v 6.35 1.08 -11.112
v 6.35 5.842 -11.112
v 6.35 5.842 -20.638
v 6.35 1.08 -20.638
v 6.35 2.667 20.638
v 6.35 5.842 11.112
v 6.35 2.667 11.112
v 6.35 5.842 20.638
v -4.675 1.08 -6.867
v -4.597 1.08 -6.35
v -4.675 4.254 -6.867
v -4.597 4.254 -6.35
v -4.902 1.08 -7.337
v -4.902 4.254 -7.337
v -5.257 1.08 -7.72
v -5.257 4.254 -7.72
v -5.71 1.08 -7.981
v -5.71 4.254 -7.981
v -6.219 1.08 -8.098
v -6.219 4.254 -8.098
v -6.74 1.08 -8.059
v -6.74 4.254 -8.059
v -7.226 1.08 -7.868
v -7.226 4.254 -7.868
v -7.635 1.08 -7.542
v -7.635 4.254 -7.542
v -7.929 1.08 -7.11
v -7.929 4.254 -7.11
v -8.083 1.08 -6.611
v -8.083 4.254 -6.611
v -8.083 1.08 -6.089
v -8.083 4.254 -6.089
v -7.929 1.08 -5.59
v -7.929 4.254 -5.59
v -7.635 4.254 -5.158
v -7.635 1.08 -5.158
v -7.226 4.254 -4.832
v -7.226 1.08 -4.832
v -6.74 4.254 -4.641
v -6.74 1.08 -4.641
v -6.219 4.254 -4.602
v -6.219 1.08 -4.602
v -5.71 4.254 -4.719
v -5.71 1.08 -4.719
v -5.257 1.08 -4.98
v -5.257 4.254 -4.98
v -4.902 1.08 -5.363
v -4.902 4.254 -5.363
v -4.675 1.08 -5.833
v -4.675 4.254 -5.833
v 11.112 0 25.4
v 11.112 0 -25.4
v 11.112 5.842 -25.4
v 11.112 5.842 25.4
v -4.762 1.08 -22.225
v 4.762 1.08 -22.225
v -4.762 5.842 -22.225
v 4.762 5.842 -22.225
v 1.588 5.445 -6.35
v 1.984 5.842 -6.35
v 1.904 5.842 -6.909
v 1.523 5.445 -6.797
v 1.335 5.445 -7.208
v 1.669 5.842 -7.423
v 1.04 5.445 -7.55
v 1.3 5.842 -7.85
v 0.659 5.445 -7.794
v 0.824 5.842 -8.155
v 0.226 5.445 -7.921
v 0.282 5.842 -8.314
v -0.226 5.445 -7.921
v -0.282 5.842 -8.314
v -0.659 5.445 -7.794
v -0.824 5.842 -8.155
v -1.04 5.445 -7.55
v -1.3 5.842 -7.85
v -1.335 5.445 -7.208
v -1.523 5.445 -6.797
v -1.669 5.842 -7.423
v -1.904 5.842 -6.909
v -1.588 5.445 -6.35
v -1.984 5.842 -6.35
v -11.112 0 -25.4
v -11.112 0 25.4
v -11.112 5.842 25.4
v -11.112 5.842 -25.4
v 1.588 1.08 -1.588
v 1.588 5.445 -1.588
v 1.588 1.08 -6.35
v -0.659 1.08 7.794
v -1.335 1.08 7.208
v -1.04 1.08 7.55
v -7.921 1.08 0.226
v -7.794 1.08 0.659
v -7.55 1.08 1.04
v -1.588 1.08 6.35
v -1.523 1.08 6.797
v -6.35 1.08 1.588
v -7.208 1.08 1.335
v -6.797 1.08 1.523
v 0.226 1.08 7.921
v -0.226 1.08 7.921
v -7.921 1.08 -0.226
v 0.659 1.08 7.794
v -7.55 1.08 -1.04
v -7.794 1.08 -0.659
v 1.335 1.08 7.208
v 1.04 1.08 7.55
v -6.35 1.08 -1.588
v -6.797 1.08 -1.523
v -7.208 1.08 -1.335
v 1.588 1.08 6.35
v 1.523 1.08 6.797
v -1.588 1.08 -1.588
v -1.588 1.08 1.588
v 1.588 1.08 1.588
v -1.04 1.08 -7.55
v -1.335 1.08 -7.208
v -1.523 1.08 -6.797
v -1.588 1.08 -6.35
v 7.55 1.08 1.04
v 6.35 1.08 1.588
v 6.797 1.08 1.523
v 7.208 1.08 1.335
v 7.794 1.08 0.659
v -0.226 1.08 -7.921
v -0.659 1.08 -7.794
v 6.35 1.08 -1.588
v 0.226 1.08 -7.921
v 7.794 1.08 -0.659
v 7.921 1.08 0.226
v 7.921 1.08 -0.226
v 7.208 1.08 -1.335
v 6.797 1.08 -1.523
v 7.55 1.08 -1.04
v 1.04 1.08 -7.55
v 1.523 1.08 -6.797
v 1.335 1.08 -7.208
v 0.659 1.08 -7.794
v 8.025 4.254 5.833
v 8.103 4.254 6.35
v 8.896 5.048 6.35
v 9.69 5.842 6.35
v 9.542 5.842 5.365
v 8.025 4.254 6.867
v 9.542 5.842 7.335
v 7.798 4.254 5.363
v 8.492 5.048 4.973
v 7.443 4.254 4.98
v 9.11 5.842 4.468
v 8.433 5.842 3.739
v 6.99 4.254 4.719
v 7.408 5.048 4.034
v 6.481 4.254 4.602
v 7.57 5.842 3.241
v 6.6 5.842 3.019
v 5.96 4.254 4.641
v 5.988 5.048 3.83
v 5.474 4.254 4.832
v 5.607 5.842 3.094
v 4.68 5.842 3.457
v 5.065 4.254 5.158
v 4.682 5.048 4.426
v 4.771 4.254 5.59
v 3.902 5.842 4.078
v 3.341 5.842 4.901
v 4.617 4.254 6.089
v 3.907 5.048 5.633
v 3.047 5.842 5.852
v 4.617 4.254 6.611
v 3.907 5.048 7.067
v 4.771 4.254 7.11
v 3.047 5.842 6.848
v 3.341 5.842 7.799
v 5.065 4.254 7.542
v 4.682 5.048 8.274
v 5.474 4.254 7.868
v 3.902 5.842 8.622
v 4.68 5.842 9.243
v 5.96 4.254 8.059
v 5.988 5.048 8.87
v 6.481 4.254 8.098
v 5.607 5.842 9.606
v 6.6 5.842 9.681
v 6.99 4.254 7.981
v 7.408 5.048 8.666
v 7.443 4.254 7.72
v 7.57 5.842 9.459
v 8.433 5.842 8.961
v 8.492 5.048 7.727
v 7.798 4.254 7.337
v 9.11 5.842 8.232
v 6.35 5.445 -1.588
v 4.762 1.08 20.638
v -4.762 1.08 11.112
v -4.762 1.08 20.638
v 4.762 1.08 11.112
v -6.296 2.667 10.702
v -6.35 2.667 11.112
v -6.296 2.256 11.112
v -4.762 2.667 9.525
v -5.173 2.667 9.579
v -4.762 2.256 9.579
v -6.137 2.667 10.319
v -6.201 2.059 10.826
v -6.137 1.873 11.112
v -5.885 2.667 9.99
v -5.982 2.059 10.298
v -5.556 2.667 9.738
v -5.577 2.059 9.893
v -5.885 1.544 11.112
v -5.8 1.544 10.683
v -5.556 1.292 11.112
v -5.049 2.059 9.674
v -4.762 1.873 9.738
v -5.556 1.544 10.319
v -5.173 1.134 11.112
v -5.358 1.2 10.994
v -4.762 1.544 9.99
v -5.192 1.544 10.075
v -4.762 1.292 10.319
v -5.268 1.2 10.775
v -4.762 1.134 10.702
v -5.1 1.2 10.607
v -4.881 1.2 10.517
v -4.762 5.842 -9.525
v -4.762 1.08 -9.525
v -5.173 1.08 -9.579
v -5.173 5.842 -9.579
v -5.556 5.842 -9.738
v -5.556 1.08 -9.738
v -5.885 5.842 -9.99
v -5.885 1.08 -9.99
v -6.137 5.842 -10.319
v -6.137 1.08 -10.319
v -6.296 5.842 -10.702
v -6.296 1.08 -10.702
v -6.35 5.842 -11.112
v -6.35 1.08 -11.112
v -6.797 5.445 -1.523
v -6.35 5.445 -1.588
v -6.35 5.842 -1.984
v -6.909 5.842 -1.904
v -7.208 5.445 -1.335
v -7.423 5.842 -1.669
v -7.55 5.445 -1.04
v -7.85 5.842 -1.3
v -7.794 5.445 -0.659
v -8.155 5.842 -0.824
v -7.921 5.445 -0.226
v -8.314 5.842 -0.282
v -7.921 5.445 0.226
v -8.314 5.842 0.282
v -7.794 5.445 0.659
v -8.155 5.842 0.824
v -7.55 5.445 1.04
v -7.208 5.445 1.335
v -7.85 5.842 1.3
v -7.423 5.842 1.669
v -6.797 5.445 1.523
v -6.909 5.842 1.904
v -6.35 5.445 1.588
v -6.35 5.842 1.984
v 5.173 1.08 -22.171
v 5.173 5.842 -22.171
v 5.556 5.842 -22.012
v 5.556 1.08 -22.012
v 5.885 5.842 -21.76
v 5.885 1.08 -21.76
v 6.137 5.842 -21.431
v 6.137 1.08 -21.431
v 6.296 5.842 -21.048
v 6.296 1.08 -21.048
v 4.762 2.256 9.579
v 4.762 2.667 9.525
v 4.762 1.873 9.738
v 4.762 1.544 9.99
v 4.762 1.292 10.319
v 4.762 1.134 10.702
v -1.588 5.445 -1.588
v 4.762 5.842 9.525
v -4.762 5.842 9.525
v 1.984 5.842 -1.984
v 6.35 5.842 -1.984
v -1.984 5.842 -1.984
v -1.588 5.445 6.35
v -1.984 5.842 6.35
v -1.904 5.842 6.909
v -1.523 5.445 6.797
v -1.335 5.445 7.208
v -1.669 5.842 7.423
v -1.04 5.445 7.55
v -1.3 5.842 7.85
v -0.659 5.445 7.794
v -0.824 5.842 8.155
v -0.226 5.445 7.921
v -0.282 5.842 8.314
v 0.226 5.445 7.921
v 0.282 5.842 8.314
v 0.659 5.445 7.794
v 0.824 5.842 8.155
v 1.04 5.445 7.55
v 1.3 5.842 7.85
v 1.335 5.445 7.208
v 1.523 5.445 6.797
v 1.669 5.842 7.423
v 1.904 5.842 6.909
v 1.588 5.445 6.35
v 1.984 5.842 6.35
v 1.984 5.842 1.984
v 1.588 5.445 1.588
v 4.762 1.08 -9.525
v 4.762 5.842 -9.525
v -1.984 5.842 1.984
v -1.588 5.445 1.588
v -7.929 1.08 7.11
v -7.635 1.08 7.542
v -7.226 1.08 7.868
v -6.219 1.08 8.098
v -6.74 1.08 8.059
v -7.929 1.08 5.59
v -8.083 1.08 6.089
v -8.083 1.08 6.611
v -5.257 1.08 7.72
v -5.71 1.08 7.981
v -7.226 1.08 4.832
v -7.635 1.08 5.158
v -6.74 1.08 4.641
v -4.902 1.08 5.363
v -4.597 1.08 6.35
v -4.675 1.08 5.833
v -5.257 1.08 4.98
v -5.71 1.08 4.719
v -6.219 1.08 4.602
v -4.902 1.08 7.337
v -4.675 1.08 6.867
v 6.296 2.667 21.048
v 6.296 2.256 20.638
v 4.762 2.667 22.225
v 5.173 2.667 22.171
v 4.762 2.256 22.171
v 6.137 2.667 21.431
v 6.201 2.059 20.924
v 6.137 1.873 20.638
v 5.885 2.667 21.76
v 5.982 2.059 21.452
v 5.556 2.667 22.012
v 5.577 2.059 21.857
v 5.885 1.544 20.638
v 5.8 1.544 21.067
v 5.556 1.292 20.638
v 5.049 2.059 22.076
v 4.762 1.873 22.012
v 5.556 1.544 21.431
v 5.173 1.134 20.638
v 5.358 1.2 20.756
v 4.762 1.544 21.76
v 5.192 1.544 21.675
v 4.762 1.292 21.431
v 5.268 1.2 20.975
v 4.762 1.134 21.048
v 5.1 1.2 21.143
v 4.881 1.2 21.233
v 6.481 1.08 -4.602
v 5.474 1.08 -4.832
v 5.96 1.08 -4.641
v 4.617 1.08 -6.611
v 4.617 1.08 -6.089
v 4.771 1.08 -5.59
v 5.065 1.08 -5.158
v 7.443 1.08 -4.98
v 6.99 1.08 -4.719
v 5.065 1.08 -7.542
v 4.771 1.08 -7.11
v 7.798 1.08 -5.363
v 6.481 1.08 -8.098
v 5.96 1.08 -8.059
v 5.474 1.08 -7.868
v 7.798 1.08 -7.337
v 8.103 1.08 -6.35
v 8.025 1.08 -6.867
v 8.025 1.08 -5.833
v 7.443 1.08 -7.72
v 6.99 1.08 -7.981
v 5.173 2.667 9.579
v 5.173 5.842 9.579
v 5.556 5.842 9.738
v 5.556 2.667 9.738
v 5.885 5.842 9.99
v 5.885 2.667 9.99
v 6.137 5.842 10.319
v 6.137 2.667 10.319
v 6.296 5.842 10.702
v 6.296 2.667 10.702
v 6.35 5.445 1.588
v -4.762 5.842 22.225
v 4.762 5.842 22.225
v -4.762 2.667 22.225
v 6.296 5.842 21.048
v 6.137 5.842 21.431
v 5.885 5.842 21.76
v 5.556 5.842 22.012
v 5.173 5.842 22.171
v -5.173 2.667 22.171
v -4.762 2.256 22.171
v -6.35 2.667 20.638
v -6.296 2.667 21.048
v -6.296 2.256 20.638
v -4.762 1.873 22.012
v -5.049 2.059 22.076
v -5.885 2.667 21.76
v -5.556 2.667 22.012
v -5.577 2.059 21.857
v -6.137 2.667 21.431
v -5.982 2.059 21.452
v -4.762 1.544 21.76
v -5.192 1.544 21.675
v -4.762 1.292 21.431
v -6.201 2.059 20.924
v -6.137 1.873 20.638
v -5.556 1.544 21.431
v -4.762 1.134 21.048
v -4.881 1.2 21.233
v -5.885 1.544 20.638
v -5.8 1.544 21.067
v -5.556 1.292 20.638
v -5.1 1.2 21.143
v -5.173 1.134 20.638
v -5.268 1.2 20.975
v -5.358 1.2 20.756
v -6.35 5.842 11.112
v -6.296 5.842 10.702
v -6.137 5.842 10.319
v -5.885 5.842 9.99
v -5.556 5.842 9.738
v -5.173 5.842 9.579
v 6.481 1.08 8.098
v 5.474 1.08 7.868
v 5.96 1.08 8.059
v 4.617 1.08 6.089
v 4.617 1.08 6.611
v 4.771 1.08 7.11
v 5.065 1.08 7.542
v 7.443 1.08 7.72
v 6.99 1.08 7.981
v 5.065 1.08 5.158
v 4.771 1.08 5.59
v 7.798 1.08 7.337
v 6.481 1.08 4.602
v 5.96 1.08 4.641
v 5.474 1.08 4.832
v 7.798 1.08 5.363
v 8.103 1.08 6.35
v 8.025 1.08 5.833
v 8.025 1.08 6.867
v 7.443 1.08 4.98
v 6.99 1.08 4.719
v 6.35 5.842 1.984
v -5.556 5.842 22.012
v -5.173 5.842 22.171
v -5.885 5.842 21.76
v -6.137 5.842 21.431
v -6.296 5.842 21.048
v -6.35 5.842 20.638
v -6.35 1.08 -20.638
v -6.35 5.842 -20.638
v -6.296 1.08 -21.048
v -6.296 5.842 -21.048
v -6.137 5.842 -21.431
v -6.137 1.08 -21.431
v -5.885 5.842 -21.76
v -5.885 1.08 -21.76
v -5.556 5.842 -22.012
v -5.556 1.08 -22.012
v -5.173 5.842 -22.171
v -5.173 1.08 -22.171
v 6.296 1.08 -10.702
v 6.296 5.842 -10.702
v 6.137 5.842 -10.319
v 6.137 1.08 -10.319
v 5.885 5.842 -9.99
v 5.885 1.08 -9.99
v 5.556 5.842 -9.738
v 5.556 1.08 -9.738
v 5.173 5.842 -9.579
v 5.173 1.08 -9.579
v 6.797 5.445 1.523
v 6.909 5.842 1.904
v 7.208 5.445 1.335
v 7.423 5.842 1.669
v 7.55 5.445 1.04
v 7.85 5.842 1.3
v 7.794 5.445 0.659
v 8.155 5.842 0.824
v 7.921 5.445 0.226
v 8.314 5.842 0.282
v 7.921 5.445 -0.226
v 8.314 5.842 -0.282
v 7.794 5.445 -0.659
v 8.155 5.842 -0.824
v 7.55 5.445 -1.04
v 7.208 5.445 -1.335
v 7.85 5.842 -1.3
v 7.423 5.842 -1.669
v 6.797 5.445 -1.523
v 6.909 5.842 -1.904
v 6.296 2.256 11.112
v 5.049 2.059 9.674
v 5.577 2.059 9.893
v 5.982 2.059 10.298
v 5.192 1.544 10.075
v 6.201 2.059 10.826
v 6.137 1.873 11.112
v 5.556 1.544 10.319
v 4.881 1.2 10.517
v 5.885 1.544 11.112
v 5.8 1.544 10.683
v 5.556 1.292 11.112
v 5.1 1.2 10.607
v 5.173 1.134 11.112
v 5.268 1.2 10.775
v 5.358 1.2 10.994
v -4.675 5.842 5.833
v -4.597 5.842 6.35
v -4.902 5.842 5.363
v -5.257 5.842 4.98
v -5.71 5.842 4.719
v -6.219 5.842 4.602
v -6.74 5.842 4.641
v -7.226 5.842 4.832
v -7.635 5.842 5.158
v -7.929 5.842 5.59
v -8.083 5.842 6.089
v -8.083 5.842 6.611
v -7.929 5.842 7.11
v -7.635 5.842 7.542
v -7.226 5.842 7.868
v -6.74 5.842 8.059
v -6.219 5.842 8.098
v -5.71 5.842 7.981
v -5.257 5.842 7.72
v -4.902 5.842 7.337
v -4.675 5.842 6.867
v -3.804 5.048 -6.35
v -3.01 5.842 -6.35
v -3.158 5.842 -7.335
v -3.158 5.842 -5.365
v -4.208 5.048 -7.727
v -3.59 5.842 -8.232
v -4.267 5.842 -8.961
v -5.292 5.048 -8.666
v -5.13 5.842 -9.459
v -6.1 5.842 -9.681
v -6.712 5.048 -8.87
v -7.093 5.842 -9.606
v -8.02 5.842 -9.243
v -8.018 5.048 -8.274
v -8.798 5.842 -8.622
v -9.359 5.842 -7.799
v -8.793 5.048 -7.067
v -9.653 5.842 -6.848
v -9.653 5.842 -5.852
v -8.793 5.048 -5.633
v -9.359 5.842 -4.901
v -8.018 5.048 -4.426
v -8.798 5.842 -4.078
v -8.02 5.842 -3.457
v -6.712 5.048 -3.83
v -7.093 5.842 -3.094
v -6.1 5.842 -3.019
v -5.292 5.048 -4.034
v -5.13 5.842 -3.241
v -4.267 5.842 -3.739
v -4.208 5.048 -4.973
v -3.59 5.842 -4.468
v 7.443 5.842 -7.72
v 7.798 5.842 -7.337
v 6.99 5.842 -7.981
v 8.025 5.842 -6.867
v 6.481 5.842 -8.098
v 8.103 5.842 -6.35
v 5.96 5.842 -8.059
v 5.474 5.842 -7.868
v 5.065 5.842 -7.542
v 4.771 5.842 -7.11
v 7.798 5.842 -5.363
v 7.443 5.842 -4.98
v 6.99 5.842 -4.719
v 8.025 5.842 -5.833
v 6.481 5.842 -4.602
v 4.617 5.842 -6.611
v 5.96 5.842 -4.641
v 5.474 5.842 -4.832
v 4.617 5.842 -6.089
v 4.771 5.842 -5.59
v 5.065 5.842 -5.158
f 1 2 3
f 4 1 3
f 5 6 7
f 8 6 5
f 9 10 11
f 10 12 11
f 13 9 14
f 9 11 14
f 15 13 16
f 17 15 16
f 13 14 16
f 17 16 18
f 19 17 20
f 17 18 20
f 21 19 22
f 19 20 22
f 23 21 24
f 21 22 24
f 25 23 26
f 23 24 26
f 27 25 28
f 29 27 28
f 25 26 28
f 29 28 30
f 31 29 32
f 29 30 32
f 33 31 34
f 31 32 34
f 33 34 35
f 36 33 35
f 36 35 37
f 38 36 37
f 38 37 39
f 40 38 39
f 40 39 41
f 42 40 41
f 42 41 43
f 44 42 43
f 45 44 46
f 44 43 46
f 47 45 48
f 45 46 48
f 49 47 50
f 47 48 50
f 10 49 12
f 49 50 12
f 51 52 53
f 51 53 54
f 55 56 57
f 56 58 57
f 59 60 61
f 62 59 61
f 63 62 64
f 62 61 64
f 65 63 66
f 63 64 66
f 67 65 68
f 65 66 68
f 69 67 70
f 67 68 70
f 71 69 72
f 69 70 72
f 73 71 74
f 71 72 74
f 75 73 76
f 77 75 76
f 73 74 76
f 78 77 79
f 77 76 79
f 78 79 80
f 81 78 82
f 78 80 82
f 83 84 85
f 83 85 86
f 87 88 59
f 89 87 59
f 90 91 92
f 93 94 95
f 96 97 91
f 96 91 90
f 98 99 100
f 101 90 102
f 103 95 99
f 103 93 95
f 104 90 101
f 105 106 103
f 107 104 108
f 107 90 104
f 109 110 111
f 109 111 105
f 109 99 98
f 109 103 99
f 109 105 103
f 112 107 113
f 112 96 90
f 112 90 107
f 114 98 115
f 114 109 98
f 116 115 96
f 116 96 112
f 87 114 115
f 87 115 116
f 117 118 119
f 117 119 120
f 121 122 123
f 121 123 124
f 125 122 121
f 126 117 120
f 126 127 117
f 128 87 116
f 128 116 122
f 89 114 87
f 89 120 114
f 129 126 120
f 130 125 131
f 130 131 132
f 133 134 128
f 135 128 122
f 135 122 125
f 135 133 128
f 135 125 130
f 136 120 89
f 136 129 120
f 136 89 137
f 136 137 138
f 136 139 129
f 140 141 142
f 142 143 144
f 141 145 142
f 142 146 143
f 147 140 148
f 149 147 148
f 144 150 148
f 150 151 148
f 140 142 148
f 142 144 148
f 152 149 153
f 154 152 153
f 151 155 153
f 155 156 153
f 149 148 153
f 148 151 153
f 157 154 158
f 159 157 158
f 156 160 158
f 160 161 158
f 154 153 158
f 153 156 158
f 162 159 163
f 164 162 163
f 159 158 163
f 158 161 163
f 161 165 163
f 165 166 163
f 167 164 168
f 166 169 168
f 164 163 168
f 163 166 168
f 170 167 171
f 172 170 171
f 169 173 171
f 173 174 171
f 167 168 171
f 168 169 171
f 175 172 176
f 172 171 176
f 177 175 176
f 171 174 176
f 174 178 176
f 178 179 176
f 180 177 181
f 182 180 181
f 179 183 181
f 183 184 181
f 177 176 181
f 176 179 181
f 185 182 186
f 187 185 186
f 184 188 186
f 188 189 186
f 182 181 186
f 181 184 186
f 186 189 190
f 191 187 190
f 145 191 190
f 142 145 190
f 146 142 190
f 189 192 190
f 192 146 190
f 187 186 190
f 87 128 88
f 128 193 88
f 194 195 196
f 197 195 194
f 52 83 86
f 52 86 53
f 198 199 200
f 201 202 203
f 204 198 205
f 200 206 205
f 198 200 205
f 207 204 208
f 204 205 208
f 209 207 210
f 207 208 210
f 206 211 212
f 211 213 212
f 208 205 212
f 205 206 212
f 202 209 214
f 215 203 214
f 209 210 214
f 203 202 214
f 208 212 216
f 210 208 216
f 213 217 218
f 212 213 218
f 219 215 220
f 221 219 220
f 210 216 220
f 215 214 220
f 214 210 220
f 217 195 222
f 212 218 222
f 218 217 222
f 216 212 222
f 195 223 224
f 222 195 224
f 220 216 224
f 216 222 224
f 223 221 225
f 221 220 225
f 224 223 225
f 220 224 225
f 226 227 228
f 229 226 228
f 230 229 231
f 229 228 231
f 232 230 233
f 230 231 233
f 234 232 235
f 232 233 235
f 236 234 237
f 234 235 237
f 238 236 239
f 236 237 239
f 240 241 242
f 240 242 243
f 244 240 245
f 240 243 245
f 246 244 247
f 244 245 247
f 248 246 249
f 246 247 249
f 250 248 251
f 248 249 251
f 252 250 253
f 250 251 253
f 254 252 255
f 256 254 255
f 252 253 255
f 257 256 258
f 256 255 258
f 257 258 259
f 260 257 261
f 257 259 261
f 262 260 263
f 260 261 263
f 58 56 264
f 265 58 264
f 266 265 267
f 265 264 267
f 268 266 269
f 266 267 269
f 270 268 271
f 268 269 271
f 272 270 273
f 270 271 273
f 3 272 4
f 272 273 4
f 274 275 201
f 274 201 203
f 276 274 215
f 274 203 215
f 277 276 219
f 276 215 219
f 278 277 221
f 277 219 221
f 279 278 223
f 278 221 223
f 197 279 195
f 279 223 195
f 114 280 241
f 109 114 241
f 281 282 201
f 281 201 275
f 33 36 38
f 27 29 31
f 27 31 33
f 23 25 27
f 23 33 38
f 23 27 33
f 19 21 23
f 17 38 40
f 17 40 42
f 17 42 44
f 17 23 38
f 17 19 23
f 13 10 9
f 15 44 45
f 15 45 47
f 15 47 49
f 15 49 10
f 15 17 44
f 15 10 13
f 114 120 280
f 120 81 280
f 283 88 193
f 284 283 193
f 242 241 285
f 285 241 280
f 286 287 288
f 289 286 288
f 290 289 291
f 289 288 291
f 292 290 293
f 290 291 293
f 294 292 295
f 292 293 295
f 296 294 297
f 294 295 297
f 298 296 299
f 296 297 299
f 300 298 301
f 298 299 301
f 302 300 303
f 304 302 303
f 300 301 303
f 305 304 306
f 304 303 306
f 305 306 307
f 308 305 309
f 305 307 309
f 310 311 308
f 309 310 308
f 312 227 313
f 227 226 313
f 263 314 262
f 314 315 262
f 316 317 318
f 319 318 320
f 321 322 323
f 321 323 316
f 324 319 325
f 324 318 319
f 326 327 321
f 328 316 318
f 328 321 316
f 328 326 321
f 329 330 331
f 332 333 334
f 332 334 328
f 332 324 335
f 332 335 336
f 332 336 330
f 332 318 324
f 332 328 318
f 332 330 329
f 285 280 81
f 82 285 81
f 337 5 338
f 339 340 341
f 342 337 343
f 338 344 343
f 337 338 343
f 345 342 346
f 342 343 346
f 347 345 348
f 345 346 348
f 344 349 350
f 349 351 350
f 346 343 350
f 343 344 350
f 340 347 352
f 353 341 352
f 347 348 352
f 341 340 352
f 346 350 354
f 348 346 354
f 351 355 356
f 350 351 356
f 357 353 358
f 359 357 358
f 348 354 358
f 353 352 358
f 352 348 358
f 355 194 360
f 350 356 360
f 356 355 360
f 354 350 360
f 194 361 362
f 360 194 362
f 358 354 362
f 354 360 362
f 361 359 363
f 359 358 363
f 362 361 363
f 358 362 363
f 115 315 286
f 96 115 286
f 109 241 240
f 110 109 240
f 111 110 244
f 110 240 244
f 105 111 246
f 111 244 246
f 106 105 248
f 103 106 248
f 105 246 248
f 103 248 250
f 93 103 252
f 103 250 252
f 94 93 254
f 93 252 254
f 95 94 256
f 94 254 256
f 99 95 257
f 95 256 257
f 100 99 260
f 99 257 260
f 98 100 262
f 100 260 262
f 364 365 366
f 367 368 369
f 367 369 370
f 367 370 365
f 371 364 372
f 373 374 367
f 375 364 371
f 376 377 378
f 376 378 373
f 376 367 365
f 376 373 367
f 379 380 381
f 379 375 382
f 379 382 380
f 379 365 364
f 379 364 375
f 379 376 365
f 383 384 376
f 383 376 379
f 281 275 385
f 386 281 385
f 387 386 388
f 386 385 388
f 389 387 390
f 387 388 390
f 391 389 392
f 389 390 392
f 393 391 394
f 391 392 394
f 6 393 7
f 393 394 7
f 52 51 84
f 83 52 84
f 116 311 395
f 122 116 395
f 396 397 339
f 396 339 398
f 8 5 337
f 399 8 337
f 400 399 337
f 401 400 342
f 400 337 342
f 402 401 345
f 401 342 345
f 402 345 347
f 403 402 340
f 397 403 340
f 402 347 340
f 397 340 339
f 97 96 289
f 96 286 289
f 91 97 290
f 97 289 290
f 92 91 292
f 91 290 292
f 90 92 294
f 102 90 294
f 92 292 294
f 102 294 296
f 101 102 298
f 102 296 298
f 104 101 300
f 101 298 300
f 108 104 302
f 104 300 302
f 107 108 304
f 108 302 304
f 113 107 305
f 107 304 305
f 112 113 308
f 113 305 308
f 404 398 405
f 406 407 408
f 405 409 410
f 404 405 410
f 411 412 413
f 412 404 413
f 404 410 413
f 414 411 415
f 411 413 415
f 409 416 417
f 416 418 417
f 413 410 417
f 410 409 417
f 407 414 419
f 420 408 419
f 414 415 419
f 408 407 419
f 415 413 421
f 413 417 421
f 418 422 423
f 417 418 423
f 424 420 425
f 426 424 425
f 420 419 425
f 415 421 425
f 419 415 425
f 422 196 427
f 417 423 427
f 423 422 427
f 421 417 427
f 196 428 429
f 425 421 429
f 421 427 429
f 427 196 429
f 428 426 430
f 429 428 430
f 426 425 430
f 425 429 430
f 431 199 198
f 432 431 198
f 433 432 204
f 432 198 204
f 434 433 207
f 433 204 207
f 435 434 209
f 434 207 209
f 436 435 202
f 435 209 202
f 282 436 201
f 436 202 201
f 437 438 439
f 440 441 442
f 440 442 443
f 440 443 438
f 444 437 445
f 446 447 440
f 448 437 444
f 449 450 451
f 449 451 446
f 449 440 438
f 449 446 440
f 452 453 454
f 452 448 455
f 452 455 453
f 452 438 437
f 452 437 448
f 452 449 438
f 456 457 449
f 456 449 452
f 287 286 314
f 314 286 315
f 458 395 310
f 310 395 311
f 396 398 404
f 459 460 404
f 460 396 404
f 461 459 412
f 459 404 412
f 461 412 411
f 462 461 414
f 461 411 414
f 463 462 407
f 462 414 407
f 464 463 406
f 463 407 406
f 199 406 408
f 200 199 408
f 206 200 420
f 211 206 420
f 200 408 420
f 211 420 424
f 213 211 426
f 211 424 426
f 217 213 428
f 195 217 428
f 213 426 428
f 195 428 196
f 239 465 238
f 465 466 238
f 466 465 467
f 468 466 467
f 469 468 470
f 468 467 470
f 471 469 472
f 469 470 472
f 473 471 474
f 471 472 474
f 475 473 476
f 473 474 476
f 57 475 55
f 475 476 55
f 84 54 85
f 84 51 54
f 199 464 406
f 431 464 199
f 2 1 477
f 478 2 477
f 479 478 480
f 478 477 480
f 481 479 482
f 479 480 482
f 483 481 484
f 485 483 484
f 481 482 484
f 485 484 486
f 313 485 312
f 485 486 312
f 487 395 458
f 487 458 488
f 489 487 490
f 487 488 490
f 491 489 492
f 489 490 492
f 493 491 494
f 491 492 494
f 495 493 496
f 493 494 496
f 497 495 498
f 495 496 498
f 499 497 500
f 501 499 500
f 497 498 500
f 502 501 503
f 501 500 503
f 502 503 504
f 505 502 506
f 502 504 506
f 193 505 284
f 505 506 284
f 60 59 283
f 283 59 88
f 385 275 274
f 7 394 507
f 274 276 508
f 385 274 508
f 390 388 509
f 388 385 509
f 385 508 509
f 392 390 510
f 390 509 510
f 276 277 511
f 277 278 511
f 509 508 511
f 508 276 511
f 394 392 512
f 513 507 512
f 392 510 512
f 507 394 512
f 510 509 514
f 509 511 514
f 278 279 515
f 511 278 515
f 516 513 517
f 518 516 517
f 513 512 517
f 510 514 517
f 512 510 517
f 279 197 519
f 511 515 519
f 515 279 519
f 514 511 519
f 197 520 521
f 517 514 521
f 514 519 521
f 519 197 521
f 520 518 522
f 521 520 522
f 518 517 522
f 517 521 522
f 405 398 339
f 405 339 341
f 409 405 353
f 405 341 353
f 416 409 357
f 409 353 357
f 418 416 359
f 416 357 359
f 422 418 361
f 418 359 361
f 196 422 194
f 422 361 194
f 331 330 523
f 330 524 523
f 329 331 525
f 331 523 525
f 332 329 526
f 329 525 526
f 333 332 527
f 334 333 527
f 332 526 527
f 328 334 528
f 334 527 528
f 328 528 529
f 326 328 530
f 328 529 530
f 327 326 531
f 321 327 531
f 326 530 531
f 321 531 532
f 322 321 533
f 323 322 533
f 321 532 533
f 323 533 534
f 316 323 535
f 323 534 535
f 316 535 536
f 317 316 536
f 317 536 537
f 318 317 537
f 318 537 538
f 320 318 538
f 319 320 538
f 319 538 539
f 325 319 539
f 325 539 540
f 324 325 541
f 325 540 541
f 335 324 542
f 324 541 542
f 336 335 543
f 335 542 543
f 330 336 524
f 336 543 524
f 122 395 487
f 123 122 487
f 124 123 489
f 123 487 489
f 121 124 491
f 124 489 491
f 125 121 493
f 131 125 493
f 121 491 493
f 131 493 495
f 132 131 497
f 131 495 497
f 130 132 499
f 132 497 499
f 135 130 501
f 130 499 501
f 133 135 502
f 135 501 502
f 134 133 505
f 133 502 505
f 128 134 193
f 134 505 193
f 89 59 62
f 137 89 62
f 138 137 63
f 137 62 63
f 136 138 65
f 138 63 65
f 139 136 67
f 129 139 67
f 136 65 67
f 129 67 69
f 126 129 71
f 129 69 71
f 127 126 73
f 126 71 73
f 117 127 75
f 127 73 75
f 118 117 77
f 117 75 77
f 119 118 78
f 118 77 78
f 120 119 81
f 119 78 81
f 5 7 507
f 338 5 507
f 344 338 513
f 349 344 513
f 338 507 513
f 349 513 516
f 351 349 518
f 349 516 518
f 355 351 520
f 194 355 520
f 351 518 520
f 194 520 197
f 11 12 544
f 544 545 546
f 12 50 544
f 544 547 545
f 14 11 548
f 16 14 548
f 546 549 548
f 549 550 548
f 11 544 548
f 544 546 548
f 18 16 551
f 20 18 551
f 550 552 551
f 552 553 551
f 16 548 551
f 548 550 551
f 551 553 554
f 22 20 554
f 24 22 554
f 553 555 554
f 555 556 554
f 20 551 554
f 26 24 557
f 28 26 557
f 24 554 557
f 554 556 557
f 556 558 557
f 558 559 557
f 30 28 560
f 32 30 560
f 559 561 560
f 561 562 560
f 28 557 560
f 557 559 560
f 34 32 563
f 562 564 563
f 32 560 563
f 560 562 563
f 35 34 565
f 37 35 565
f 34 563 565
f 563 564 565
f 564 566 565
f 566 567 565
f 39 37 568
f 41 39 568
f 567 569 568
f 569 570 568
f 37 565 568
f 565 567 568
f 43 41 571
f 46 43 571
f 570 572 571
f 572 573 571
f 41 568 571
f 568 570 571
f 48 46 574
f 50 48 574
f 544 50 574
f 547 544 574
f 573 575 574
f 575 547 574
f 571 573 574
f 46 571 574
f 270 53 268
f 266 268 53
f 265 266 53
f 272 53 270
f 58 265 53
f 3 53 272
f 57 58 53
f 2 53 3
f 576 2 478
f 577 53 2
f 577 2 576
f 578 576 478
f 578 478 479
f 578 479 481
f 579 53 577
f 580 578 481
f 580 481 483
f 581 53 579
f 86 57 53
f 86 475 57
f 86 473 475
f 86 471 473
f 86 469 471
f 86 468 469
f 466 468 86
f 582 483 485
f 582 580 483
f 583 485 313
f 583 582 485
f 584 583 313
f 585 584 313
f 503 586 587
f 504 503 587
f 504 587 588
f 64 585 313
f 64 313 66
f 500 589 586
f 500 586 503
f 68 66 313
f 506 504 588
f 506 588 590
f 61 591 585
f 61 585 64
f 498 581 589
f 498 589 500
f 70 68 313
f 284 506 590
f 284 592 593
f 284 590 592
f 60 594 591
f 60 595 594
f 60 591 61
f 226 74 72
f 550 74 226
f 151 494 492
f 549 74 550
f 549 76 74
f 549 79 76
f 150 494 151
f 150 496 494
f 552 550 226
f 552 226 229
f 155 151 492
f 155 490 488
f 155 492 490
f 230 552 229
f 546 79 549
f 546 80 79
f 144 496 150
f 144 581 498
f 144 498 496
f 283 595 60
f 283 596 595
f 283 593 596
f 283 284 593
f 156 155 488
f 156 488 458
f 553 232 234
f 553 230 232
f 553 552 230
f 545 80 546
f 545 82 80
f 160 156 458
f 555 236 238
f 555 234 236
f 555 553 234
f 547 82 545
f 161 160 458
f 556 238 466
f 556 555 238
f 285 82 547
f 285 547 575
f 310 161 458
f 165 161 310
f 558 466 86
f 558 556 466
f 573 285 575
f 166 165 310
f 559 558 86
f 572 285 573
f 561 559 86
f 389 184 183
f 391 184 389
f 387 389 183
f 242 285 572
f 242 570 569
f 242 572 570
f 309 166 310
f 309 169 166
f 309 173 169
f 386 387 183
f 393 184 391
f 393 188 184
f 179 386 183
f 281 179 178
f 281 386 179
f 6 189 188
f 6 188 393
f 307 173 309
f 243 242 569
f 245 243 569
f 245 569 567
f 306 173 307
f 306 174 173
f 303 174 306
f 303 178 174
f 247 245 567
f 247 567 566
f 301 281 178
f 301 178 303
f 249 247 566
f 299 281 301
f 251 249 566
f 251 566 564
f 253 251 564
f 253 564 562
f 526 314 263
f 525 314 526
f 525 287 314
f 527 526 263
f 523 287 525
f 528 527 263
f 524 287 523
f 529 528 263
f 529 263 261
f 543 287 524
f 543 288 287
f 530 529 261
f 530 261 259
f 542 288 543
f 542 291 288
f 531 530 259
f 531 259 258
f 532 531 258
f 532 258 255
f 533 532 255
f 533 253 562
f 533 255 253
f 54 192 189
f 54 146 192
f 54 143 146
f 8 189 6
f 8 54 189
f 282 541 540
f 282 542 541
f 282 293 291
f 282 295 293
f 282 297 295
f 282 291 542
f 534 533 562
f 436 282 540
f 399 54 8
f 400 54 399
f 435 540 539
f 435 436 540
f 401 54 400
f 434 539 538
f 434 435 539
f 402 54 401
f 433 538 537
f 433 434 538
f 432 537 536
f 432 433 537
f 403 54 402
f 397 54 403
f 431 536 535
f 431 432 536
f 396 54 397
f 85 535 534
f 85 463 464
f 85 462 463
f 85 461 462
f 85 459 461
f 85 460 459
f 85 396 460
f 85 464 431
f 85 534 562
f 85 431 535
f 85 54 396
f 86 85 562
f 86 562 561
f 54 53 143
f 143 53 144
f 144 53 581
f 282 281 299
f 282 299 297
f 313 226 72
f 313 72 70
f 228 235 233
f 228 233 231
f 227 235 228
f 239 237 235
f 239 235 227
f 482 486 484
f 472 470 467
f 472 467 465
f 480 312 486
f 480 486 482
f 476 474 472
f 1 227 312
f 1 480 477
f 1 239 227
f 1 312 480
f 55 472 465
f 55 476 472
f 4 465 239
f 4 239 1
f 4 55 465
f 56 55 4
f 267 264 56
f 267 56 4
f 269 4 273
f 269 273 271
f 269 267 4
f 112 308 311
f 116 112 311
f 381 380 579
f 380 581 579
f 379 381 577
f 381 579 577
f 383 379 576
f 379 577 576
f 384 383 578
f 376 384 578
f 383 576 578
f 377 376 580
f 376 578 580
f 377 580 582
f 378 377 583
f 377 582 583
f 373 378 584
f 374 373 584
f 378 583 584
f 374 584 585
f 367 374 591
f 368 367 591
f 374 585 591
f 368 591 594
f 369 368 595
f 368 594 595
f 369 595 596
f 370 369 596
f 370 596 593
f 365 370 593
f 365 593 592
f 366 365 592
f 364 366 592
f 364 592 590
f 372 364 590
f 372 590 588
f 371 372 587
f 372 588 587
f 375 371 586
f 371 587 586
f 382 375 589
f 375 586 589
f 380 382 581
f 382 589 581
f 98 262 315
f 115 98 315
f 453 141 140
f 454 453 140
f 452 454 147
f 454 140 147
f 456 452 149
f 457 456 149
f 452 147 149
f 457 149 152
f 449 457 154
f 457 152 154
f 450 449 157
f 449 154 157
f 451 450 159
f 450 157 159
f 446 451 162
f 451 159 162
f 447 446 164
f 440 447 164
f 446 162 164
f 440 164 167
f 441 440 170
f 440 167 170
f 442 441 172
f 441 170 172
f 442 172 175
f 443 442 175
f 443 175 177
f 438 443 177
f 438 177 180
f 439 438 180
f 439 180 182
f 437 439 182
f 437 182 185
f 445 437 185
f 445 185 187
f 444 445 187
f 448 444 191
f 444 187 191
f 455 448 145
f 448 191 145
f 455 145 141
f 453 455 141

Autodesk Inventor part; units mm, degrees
ref_plane "YZ Plane" through (0, 0, 0) normal (1, 0, 0) x (0, 1, 0)
ref_plane "XZ Plane" through (0, 0, 0) normal (0, 1, 0) x (-1, 0, 0)
ref_plane "XY Plane" through (0, 0, 0) normal (0, 0, 1) x (1, 0, 0)
sketch "Sketch1" plane through (0, 0, 0) normal (0, 1, 0) x (-1, 0, 0)
  line L0 (-11.1125, 25.4) -> (11.1125, 25.4)
  line L1 (11.1125, 25.4) -> (11.1125, -25.4)
  line L2 (11.1125, -25.4) -> (-11.1125, -25.4)
  line L3 (-11.1125, -25.4) -> (-11.1125, 25.4)
  line L4 (-11.1125, 25.4) -> (11.1125, -25.4) construction
  line L5 (11.1125, 25.4) -> (-11.1125, -25.4) construction
  point P0 (0, 0)
  dimension "d0" = 22.225
  dimension "d1" = 50.8
extrude "Extrusion1" add sketch "Sketch1" along normal blind 5.842
sketch "Sketch2" plane through (0, 5.842, 0) normal (0, 1, 0) x (1, 0, 0)
  line L0 (-11.1125, -25.4) -> (11.1125, -25.4) construction
  line L1 (0, -25.4) -> (0, 25.4) construction
  line L2 (11.1125, 25.4) -> (-11.1125, 25.4) construction
  line L3 (-11.1125, 25.4) -> (-11.1125, -25.4) construction
  line L4 (-11.1125, 0) -> (11.1125, 0) construction
  line L5 (11.1125, -25.4) -> (11.1125, 25.4) construction
  line L6 (6.35, 0) -> (-6.35, 0) construction
  line L7 (6.35, 1.5875) -> (-6.35, 1.5875)
  line L8 (-6.35, -1.5875) -> (6.35, -1.5875)
  arc A0 (6.35, -1.5875) -> (6.35, 1.5875) centre (6.35, 0) ccw
  arc A1 (-6.35, 1.5875) -> (-6.35, -1.5875) centre (-6.35, 0) ccw
  line L9 (0, -6.35) -> (0, 6.35) construction
  line L10 (1.5875, -6.35) -> (1.5875, 6.35)
  line L11 (-1.5875, 6.35) -> (-1.5875, -6.35)
  arc A2 (-1.5875, -6.35) -> (1.5875, -6.35) centre (0, -6.35) ccw
  arc A3 (1.5875, 6.35) -> (-1.5875, 6.35) centre (0, 6.35) ccw
  line L12 (6.35, -22.225) -> (-6.35, -22.225)
  line L13 (-6.35, -22.225) -> (-6.35, -9.525)
  line L14 (-6.35, -9.525) -> (6.35, -9.525)
  line L15 (6.35, -9.525) -> (6.35, -22.225)
  line L16 (6.35, -22.225) -> (-6.35, -9.525) construction
  line L17 (-6.35, -22.225) -> (6.35, -9.525) construction
  line L18 (6.35, 22.225) -> (-6.35, 22.225)
  line L19 (-6.35, 22.225) -> (-6.35, 9.525)
  line L20 (-6.35, 9.525) -> (6.35, 9.525)
  line L21 (6.35, 9.525) -> (6.35, 22.225)
  line L22 (6.35, 22.225) -> (-6.35, 9.525) construction
  line L23 (-6.35, 22.225) -> (6.35, 9.525) construction
  line L24 (6.35, -6.35) -> (-6.35, -6.35) construction
  line L25 (-6.35, -6.35) -> (-6.35, 6.35) construction
  line L26 (-6.35, 6.35) -> (6.35, 6.35) construction
  line L27 (6.35, 6.35) -> (6.35, -6.35) construction
  line L28 (6.35, -6.35) -> (-6.35, 6.35) construction
  line L29 (-6.35, -6.35) -> (6.35, 6.35) construction
  circle A4 centre (-6.35, -6.35) radius 1.7526
  circle A5 centre (-6.35, 6.35) radius 1.7526
  circle A6 centre (6.35, -6.35) radius 1.7526
  circle A7 centre (6.35, 6.35) radius 1.7526
  point P0 (0, 0)
  point P1 (0, -15.875)
  point P2 (0, 15.875)
  point P3 (-1.5875, 1.5875)
  point P4 (-1.5875, -1.5875)
  point P5 (1.5875, -1.5875)
  point P6 (1.5875, 1.5875)
  dimension "d4" = 6.35
  dimension "d5" = 3.175
  dimension "d6" = 6.35
  dimension "d7" = 3.175
  dimension "d8" = 12.7
  dimension "d9" = 12.7
  dimension "d10" = 9.525
  dimension "d11" = 12.7
  dimension "d12" = 12.7
  dimension "d13" = 3.5052
  dimension "d14" = 3.5052
  dimension "d15" = 3.5052
  dimension "d16" = 3.5052
extrude "Extrusion2" cut sketch "Sketch2" against normal blind 4.7625
fillet "Fillet1" radius 1.5875 8 edges at (-6.35, 3.4608, 22.225) (-6.35, 3.4608, 9.525) (6.35, 3.4608, 22.225) (6.35, 3.4608, 9.525) (-6.35, 3.4608, -9.525) (-6.35, 3.4608, -22.225) (6.35, 3.4608, -22.225) (6.35, 3.4608, -9.525)
chamfer "Chamfer1" distance 1.5875 angle 45 2 edges at (4.5974, 5.842, 6.35) (-8.1026, 5.842, -6.35)
chamfer "Chamfer2" distance 0.3969 angle 45 12 edges at (-1.5875, 5.842, -3.9687) (0, 5.842, -7.9375) (1.5875, 5.842, -3.9687) (-3.9688, 5.842, -1.5875) (-7.9375, 5.842, 0) (-3.9687, 5.842, 1.5875) (-1.5875, 5.842, 3.9687) (0, 5.842, 7.9375) (1.5875, 5.842, 3.9687) (3.9687, 5.842, -1.5875) (7.9375, 5.842, 0) (3.9688, 5.842, 1.5875)
fillet "Fillet2" radius 1.5875 8 edges at (-5.885, 1.0795, 21.76) (-6.35, 1.0795, 15.875) (-5.885, 1.0795, 9.99) (0, 1.0795, 9.525) (5.885, 1.0795, 9.99) (6.35, 1.0795, 15.875) (5.885, 1.0795, 21.76) (0, 1.0795, 22.225)
properties part number "Recipe Test A"
